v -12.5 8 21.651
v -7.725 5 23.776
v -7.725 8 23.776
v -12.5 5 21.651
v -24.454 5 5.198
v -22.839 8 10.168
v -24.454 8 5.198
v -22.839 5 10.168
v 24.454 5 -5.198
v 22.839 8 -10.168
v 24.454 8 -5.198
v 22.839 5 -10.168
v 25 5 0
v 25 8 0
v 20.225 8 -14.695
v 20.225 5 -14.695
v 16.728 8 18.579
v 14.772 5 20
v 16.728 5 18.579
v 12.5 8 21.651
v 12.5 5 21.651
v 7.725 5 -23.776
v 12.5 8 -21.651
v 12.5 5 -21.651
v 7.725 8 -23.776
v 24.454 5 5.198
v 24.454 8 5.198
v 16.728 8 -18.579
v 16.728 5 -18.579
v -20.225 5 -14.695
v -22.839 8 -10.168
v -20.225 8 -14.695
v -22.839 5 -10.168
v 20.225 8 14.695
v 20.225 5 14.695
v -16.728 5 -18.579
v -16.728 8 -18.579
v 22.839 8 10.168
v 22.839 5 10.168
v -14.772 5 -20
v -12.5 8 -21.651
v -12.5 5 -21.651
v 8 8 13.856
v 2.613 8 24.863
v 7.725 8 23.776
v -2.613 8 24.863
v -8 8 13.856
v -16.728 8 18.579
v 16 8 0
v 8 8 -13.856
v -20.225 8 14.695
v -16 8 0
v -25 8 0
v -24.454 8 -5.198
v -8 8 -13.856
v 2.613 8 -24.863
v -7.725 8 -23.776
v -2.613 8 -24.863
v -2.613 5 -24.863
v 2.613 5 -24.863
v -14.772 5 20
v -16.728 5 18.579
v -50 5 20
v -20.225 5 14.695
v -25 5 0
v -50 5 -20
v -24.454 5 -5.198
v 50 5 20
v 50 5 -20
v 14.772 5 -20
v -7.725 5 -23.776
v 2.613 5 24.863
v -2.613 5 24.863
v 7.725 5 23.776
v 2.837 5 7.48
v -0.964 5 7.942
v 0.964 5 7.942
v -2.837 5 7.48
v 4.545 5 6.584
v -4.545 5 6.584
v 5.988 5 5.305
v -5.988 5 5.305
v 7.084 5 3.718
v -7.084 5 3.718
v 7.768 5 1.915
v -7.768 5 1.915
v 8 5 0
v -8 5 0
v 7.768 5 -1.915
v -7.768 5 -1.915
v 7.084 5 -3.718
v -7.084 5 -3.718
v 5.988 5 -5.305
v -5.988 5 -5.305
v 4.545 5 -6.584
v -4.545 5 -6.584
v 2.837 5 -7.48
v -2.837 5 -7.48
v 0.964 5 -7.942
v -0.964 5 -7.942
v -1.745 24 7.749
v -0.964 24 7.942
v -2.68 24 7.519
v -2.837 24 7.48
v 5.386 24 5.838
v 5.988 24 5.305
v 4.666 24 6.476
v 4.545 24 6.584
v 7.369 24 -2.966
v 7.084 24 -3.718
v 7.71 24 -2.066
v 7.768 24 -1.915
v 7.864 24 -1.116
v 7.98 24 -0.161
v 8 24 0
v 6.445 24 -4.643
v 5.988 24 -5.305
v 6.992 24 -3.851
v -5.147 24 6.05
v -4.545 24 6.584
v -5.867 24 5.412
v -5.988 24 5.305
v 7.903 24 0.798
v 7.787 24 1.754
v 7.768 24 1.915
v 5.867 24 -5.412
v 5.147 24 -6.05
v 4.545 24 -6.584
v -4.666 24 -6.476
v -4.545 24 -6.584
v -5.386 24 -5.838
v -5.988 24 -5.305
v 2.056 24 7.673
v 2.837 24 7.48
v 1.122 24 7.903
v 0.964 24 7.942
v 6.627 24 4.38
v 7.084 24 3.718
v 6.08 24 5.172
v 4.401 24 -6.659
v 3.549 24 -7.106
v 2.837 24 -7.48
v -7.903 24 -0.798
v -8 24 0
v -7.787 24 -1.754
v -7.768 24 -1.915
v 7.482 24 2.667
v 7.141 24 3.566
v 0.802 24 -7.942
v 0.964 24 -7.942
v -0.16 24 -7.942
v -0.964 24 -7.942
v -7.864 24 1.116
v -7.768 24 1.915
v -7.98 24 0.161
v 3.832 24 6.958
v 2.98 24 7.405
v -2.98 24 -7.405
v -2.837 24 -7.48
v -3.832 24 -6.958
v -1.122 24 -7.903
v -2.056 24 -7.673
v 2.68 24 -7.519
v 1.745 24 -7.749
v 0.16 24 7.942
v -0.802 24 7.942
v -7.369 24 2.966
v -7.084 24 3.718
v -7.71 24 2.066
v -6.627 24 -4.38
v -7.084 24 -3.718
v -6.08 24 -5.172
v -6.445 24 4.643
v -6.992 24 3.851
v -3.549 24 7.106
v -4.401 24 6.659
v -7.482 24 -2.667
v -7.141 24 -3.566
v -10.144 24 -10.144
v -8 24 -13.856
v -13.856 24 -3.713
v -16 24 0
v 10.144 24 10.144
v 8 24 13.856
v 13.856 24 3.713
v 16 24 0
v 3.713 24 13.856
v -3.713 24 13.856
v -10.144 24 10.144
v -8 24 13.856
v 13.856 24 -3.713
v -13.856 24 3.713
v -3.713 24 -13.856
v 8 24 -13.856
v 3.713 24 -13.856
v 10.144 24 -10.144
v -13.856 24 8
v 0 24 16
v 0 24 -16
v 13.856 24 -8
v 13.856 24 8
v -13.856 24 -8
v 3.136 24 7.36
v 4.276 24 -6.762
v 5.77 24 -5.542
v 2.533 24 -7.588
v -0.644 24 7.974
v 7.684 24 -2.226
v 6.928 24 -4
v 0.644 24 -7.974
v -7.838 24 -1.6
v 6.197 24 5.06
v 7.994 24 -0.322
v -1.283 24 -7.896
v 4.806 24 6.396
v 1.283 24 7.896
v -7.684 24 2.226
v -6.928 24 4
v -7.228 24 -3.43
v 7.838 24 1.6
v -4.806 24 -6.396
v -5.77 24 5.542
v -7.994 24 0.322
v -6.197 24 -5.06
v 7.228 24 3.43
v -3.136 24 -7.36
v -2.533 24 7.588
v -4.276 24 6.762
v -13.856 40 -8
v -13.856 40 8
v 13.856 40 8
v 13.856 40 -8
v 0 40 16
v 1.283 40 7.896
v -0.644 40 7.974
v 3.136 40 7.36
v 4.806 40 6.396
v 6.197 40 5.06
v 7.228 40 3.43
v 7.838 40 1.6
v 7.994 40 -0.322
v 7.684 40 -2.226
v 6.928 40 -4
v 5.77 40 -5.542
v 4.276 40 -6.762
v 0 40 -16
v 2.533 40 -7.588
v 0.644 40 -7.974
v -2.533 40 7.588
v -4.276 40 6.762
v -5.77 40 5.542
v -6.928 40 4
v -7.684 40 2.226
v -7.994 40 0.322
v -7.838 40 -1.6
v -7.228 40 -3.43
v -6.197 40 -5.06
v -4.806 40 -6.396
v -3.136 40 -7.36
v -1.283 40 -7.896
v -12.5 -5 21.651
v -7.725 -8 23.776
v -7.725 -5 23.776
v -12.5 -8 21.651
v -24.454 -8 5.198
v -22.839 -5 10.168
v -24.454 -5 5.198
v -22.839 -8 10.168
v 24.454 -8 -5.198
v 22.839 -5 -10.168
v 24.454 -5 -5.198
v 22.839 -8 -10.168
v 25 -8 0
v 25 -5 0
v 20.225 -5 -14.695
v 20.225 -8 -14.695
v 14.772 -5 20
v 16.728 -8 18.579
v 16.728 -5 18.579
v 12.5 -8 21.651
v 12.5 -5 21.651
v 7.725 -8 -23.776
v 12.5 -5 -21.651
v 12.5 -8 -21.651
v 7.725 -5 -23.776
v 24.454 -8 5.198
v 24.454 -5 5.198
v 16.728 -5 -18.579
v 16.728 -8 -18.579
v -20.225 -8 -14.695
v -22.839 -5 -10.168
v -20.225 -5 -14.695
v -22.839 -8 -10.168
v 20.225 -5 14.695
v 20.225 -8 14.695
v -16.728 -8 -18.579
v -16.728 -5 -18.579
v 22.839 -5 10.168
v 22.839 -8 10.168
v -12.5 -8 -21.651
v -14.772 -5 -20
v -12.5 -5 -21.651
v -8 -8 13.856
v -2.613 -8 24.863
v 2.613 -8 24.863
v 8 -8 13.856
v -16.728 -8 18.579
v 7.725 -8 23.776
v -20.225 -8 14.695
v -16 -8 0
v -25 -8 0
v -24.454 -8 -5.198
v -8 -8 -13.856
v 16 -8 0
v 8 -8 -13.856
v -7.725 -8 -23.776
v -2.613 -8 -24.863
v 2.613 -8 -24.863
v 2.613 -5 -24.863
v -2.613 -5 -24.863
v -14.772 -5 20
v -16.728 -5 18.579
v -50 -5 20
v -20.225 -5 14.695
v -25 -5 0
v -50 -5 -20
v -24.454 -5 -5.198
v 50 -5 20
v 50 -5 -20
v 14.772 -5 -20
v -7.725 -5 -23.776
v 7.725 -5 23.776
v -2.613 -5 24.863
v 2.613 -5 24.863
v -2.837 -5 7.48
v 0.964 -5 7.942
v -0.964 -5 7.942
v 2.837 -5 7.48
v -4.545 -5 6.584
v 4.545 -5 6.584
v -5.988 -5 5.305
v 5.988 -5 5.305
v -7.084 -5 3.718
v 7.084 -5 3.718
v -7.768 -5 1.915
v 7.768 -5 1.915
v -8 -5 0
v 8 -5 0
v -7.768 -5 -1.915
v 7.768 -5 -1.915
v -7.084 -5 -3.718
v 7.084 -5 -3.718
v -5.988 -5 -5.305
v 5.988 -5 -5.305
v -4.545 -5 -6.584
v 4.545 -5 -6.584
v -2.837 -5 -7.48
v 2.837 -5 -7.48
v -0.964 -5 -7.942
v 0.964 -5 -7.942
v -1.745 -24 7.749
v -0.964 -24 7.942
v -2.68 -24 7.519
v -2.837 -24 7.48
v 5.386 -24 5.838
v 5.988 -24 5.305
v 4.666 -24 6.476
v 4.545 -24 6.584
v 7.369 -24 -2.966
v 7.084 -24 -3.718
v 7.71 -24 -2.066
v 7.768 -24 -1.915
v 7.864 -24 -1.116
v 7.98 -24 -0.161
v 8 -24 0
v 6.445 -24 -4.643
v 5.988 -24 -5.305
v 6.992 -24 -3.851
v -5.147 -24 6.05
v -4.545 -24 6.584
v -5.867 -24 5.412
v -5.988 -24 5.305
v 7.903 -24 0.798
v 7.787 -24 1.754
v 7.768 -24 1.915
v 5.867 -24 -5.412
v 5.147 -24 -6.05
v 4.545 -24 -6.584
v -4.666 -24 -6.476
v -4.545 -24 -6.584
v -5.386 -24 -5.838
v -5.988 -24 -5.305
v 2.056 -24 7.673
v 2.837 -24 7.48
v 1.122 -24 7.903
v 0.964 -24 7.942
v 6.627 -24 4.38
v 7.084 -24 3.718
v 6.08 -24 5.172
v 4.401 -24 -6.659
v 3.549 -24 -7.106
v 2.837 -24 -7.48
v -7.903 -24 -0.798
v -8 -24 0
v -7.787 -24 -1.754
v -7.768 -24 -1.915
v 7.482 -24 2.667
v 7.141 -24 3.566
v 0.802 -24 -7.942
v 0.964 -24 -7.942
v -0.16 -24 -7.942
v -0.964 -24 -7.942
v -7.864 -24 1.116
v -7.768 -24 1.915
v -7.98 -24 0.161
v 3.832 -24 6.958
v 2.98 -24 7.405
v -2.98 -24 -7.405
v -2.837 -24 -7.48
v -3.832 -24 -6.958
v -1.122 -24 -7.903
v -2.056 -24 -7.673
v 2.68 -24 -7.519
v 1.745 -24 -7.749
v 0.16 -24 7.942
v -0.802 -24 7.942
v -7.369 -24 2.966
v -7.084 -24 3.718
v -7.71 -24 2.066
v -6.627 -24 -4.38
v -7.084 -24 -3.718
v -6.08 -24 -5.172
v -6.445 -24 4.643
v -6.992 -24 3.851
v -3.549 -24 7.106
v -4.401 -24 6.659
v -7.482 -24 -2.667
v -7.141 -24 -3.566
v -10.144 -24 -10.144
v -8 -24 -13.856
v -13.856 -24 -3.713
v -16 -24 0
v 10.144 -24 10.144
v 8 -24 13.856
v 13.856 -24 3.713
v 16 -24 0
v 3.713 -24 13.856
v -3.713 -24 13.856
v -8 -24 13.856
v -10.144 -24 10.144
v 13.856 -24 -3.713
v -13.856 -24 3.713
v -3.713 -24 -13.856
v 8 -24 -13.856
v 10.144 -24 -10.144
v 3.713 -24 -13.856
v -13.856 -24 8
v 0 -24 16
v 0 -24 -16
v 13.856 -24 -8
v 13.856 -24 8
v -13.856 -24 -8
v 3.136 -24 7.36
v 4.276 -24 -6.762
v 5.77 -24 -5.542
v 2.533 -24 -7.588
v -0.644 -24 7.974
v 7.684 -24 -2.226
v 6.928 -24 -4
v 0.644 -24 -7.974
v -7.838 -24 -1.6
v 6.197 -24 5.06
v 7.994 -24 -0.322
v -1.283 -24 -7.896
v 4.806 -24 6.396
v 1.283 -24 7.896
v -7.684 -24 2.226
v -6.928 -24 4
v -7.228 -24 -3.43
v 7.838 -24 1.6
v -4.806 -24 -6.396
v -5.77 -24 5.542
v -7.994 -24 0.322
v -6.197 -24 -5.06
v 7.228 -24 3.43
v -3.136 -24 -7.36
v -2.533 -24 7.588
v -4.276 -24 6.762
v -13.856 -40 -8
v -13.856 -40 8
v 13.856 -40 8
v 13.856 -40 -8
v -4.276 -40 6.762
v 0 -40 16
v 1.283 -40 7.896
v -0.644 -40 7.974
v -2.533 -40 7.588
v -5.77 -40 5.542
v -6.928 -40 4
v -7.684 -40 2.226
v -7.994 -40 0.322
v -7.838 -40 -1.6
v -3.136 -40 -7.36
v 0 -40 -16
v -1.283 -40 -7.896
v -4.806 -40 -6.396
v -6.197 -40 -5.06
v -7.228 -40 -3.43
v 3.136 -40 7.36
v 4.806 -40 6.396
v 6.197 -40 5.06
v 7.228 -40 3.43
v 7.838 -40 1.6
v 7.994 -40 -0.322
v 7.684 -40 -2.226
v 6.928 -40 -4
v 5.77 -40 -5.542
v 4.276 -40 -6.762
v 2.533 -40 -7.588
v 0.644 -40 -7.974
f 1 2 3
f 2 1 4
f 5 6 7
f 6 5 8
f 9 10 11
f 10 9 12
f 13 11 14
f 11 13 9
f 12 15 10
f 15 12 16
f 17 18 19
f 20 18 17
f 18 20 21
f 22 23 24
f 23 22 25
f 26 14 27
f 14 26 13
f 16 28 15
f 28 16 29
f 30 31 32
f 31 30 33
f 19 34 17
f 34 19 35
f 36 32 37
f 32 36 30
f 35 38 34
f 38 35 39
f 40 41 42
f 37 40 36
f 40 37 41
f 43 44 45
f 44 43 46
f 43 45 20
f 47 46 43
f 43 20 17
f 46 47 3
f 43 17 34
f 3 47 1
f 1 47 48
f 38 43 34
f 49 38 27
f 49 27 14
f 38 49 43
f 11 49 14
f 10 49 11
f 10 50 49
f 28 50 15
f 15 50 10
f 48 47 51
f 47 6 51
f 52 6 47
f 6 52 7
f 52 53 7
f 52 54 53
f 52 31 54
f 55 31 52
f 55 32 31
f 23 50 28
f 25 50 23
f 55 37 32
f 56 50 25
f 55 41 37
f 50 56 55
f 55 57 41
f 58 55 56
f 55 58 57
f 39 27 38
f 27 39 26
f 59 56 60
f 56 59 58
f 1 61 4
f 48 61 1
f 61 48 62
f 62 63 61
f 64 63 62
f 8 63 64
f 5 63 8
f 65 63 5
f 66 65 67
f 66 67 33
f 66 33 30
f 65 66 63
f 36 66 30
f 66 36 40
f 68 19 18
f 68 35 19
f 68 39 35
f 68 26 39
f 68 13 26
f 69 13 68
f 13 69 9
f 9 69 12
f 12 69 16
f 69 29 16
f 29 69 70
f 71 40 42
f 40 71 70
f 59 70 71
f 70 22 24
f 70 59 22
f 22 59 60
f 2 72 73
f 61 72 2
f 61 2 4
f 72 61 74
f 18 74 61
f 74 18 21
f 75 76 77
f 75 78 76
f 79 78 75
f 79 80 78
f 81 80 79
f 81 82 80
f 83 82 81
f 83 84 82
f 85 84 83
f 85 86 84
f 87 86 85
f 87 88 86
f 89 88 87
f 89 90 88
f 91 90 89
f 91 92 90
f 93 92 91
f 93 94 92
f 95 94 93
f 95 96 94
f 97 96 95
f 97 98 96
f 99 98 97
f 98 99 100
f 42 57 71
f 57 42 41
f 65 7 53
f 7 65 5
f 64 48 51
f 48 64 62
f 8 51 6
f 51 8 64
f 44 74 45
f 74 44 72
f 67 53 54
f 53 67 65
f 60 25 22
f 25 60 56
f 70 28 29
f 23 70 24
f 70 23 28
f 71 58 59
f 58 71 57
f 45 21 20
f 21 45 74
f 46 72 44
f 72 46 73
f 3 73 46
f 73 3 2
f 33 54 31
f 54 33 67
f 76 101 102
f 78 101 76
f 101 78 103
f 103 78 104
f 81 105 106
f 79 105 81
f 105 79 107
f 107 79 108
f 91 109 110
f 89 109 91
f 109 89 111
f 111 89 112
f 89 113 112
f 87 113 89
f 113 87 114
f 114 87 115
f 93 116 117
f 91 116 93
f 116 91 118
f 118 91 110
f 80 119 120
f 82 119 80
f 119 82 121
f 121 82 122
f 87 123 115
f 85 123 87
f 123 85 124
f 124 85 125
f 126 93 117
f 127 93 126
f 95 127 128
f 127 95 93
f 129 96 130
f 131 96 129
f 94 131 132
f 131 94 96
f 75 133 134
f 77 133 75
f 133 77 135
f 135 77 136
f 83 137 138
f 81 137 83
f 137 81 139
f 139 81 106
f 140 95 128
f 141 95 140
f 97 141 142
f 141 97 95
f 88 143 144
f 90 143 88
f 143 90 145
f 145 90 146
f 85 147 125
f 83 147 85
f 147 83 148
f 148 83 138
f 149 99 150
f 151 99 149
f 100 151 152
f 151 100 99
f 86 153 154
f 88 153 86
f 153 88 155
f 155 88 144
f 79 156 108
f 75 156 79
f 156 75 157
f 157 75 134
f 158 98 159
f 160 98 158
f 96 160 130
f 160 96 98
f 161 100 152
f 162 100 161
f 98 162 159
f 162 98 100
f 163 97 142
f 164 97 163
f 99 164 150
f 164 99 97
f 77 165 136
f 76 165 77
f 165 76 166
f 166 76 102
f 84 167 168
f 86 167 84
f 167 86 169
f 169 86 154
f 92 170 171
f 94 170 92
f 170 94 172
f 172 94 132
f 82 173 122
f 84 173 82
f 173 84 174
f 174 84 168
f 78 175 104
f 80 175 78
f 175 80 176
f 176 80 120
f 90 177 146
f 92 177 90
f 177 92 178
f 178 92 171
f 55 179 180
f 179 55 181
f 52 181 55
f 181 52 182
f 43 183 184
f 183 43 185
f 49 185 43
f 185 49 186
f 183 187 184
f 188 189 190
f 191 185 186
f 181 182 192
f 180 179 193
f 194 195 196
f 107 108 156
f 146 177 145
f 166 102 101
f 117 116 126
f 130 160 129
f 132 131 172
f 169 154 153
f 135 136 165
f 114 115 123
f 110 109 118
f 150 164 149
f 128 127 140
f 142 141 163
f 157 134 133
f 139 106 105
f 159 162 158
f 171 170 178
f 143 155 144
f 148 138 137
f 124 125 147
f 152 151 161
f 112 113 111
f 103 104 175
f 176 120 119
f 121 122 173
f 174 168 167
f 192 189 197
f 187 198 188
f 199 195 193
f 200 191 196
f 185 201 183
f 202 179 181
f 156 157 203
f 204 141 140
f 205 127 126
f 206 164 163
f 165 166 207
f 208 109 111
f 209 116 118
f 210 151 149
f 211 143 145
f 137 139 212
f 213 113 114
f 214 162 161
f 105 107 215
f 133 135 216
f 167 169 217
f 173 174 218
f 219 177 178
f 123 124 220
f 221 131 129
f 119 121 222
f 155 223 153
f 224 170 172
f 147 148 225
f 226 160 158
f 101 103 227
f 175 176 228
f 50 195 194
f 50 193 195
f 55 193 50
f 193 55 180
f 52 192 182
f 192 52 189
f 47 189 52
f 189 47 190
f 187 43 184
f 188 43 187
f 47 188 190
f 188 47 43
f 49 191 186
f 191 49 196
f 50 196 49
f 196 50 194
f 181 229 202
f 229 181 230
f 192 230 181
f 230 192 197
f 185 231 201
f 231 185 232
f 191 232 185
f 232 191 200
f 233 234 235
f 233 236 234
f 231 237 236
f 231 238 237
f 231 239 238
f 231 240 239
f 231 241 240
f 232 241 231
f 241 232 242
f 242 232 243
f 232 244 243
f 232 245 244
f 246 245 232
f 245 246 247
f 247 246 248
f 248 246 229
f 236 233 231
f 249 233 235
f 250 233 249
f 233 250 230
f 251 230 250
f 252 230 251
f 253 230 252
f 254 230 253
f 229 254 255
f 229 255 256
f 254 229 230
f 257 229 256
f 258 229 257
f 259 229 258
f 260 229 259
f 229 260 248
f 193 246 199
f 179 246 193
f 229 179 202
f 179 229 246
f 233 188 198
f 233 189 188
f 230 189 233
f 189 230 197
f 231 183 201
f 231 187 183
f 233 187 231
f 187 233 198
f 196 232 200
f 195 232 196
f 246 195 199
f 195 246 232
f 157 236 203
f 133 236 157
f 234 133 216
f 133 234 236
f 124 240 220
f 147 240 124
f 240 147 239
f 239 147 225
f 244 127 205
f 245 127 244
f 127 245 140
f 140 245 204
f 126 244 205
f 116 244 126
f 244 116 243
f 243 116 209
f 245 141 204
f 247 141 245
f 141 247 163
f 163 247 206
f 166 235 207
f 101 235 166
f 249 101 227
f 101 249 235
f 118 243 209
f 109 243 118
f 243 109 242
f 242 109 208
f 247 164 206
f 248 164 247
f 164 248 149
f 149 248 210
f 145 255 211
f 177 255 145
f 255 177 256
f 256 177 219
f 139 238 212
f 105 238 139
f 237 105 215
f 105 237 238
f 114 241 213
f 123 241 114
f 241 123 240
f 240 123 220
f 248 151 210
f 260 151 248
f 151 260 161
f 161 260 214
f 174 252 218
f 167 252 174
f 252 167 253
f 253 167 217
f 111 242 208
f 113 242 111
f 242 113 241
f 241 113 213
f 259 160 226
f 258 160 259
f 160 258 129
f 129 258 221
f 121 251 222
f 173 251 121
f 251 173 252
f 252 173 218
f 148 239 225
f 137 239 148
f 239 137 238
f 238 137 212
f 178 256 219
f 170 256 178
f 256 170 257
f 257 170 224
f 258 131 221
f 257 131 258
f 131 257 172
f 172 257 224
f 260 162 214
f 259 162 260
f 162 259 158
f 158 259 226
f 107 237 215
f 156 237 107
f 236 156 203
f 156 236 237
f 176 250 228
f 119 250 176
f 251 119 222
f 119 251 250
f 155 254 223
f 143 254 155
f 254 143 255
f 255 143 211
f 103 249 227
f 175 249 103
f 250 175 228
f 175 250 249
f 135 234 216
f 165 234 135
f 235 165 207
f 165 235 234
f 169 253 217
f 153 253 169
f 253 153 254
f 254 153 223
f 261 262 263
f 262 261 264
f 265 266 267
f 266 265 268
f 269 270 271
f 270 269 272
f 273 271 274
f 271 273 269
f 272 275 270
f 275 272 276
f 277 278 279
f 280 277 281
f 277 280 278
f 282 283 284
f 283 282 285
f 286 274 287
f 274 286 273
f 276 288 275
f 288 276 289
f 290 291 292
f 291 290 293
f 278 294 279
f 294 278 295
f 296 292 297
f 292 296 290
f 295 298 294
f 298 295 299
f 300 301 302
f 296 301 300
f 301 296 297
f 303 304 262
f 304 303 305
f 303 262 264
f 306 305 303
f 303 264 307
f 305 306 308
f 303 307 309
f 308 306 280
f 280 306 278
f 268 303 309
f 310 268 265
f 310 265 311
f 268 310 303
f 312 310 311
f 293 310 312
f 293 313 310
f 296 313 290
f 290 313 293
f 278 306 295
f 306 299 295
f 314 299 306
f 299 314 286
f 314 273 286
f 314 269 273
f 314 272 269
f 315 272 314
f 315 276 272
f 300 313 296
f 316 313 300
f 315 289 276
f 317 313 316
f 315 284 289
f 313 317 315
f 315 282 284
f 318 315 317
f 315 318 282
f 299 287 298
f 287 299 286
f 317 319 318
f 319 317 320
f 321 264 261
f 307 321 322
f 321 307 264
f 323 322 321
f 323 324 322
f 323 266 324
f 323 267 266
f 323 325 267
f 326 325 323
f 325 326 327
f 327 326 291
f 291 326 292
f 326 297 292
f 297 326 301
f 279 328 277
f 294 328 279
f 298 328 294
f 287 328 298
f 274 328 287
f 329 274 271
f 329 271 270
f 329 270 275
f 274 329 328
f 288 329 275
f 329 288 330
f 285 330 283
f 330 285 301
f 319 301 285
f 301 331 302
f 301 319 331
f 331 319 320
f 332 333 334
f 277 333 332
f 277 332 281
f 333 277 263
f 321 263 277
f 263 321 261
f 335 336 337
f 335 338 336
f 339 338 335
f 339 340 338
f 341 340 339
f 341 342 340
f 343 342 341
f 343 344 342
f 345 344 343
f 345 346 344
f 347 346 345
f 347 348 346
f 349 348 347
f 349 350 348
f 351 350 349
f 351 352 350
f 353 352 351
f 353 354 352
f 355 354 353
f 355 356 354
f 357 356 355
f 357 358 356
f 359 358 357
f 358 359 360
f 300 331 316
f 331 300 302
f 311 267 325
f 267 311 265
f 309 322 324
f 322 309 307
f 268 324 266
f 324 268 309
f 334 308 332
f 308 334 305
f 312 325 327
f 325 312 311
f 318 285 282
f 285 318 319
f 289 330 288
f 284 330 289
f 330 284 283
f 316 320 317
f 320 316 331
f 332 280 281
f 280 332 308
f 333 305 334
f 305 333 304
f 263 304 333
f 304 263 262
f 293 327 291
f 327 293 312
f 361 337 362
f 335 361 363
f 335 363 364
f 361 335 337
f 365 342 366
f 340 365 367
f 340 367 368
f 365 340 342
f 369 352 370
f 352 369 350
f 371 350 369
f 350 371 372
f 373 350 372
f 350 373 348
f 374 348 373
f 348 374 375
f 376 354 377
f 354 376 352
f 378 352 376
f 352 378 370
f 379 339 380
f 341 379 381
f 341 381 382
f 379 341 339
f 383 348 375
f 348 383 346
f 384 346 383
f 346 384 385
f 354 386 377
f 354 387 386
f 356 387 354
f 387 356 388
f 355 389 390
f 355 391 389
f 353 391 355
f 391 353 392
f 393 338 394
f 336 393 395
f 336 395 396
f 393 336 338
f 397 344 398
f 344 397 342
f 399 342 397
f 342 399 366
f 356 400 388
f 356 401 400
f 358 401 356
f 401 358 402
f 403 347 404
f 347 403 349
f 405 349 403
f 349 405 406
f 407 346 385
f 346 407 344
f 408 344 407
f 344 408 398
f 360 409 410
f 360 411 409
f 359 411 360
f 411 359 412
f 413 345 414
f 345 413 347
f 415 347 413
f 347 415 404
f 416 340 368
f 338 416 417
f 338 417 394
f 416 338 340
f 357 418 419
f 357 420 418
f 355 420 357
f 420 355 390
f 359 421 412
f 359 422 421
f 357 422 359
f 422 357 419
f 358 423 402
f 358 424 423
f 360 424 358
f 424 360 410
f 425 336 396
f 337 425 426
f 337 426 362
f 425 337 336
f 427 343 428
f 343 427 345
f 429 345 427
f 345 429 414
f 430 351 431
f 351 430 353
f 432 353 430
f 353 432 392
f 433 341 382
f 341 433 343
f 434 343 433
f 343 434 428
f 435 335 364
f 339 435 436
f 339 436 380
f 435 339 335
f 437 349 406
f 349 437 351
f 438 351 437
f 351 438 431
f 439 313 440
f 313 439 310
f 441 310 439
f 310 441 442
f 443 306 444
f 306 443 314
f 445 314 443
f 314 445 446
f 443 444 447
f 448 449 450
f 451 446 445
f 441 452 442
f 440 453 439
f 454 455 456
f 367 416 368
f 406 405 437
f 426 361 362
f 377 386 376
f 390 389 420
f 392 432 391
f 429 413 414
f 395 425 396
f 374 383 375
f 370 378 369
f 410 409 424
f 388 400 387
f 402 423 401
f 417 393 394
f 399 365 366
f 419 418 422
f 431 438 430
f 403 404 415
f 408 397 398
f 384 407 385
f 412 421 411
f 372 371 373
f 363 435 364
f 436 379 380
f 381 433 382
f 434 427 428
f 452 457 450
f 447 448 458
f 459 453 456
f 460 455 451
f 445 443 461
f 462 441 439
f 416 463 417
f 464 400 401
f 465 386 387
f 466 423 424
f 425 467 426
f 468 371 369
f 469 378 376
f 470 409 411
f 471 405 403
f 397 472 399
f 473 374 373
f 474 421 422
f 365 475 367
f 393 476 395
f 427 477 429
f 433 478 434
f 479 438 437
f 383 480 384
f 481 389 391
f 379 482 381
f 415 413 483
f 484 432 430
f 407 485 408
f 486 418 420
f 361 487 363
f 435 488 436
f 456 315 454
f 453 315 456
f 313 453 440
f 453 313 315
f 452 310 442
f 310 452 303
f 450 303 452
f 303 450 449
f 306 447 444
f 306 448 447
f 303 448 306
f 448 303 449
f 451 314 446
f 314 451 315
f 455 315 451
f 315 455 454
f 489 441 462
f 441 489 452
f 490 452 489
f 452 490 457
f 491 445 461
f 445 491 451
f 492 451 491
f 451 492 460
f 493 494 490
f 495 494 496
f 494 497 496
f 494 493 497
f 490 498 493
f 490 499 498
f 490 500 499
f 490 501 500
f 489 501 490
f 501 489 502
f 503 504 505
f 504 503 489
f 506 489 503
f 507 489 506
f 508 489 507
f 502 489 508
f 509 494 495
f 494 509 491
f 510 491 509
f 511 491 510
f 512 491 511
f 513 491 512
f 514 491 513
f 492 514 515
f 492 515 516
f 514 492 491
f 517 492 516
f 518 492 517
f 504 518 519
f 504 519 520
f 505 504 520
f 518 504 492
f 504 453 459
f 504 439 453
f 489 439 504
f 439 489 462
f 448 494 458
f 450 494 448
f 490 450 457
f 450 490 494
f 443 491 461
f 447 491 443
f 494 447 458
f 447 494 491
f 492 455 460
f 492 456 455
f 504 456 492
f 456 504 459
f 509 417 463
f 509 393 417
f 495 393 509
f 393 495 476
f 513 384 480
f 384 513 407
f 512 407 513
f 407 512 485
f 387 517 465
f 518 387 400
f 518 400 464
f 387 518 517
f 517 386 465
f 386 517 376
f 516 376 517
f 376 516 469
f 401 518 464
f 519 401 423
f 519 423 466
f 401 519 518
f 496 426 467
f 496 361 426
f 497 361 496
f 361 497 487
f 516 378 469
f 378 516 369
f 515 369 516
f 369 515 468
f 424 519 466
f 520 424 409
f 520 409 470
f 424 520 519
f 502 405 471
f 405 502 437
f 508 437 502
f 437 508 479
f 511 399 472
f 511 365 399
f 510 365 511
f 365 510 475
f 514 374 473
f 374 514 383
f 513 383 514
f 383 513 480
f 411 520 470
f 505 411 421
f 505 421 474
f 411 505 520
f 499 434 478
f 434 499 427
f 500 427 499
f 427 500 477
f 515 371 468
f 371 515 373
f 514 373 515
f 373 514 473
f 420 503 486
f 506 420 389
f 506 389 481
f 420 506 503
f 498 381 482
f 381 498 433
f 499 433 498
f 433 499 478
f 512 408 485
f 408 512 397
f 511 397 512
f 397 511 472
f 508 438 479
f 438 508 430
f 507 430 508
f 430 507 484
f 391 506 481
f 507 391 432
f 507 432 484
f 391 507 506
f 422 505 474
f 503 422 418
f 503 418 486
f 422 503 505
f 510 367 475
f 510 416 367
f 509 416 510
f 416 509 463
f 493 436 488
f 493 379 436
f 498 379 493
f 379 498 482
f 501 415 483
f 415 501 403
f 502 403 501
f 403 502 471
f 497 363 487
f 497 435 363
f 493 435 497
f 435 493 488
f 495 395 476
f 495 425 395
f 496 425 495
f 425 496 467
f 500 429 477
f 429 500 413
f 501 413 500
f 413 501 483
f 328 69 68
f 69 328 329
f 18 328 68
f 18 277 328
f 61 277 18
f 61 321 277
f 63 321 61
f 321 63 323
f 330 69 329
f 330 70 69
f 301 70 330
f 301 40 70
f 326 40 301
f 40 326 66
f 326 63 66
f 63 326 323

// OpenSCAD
// file: ../common/beam_hexagonal.scad
// include <../../config.scad>;

module beam_hexagonal(L, d, centre = true, suppress_shopping_outputs = false) {
    radius = d / 2;
    linear_extrude(L, center = centre) polygon([[radius, 0], [radius * cos(60), radius * sin(60)], [radius * cos(120), radius * sin(120)], [radius * cos(180), radius * sin(180)], [radius * cos(240), radius * sin(240)], [radius * cos(300), radius * sin(300)]]);
    // Shopping
    if (!suppress_shopping_outputs) {
        echo(str("Hexagonal beam: Hexagonal beam Φ", d, "mm x ", L, "mm - x1"));
    }
}

// $fn = 200;
beam_hexagonal(500, 50);
// file: ../fixings/tube_clamp_square_base_plate_132_functions.scad
function get_L_shaft_with_base_plate_square_base_plate_132(beam_width) = 
    // (beam_width == 40) ?
    75
;
function get_R_plate_square_base_plate_132(beam_width) = 
    // (beam_width == 40) ?
    [143, 75, 18.5]
;
function get_thickness_square_base_plate_132(beam_width) = 
    // (beam_width == 40) ?
    8
;
function get_offset_hole_x_square_base_plate_132(beam_width) = 
    // (beam_width == 40) ?
    100 / 2
;
function get_diameter_hole_square_base_plate_132(beam_width) = 
    // (beam_width == 40) ?
    10
;
// file: ../fixings/tube_clamp_round_base_plate_132_functions.scad
function get_L_shaft_with_base_plate_round_base_plate_132(tube_diameter) = 
    (tube_diameter == 27) ? 
        85
    : (tube_diameter == 42) ?
        122
    : 25
;
function get_R_plate_round_base_plate_132(tube_diameter) = 
    (tube_diameter == 27) ? 
        [64, 114, 7]
    : (tube_diameter == 42) ?
        [80, 140, 10]
    : [10, 20, 1]
;
function get_offset_hole_y_round_base_plate_132(tube_diameter) = 
    (tube_diameter == 27) ? 
        38
    : (tube_diameter == 42) ?
        50
    : 10
;
function get_diameter_hole_round_base_plate_132(tube_diameter) = 10;
// file: ../fixings/tube_clamp_round_3_way_through_116_functions.scad
function  get_L_shaft_long_round_3_way_through_116(tube_diameter) = 
    (tube_diameter == 27) ? 
        42
    : (tube_diameter == 42) ?
        60
    : 25
;
function get_thickness_round_3_way_through_116(tube_diameter) = 7;
function get_L_shaft_short_round_3_way_through_116(tube_diameter) = tube_diameter + 2 * get_thickness_round_3_way_through_116();
// file: ../fixings/tube_clamp_round_tee_long_104_functions.scad
// include <../../config.scad>;

function get_L_shaft_long_round_tee_long_104(tube_diameter) = 
    (tube_diameter == 27) ? 
        85
    : (tube_diameter == 42) ?
        122
    : 25
;
function get_L_shaft_short_round_tee_long_104(tube_diameter) = 
    (tube_diameter == 27) ? 
        42
    : (tube_diameter == 42) ?
        61
    : 10
;
// file: brake_assembly_functions.scad
// include <../../config.scad>; // circular reference!

function get_y_pos_lead_fixing_ballscrew_to_brake_arms(angle_brake_rod, y_pos_axle_rear, x_pos_axle_leg_rear, x_offset_fixing_brake_arm_to_lead_plate) = y_pos_axle_rear + (x_pos_axle_leg_rear - x_offset_fixing_brake_arm_to_lead_plate) / tan(angle_brake_rod); // (X_POS_AXLE_LEG_REAR - X_OFFSET_FIXING_BRAKE_ARM_TO_LEAD_PLATE)
// file: ../common/metric_bolt_functions.scad
function get_metric_bolt_head_height(size) = size;
function get_metric_bolt_head_diameter(size) = size * 2;
function get_metric_bolt_washer_diameter_safe_working_clearance(size) = 
    (size < 20) ?
        4 * size
    :
        3 * size
;
// file: ../common/washer.scad
include <../../config.scad>;

module washer(t, d_outer, d_inner, centre = true) {
    r_outer = d_outer / 2;
    r_inner = d_inner / 2;
    color("silver") difference() {
        cylinder(t, r_outer, r_outer, center = centre);
        cylinder(t, r_inner, r_inner, center = centre);
    }
    // Shopping
    echo(str("Washer: Washer Φ", d_outer, "mm x ", d_inner, "mm x ", t, "mm - x1"));
}

// $fn = 200;
washer(3, 10, 40);
// file: ../common/metric_nut.scad
// include <../../config.scad>;
use <./beam_hexagonal.scad>;
use <./metric_bolt_functions.scad>;

module metric_nut(size, centre = true) {
    height = get_metric_bolt_head_height(size);
    diameter = get_metric_bolt_head_diameter(size);
    radius = diameter / 2;
    color("gray") difference() {
        // body
        beam_hexagonal(height, diameter, centre = centre, suppress_shopping_outputs = true);
        // hole
        cylinder(height, size / 2, size / 2, center = centre);
    }
    // Shopping
    echo(str("Nut: Nut M", size, " - x1"));
}

// $fn = 200;
metric_nut(12);
// main file
include <../../config.scad>;
use <../common/metric_nut.scad>;
use <../common/washer.scad>;

module fixing_brake_ballscrew_to_brake_arms() {
    h_nut = get_metric_bolt_head_height(D_BRAKE_BALLSCREW_AXLE);
    count_nuts_each_side = 2;
    union() {
        // ballscrew positioning plate
        color(COLOUR_FILAMENT_3D_PRINTER) cube(R_LEAD_FIXING_BRAKE_BALLSCREW_TO_BRAKE_ARMS, center = true);
        
        for (index_side_y = [0:1:1]) {
            mirror([0, index_side_y, 0]) {
                // washers
                translate([0, R_LEAD_FIXING_BRAKE_BALLSCREW_TO_BRAKE_ARMS[1] / 2 + T_WASHER_BRAKE_BALLSCREW_POWER_WHEEL / 2, 0]) rotate([-90, 0, 0]) washer(T_WASHER_BRAKE_BALLSCREW_POWER_WHEEL, D_WASHER_BRAKE_BALLSCREW_POWER_WHEEL, D_BRAKE_BALLSCREW_AXLE);
                // nuts
                for (index_nut = [0 : 1 : count_nuts_each_side - 1]) {
                    translate([0, R_LEAD_FIXING_BRAKE_BALLSCREW_TO_BRAKE_ARMS[1] / 2 + T_WASHER_BRAKE_BALLSCREW_POWER_WHEEL + h_nut * index_nut, 0]) rotate([-90, 0, 0]) rotate([0, 0, 30 * index_nut]) metric_nut(D_BRAKE_BALLSCREW_AXLE, centre = false);
                }
            }
        }
    }
    // Shopping
    echo("Fixing brake ballscrew to brake arms: 3D printed component - x1");
    // Axle fastener washers
    // Axle fastener nuts
}

fixing_brake_ballscrew_to_brake_arms();
